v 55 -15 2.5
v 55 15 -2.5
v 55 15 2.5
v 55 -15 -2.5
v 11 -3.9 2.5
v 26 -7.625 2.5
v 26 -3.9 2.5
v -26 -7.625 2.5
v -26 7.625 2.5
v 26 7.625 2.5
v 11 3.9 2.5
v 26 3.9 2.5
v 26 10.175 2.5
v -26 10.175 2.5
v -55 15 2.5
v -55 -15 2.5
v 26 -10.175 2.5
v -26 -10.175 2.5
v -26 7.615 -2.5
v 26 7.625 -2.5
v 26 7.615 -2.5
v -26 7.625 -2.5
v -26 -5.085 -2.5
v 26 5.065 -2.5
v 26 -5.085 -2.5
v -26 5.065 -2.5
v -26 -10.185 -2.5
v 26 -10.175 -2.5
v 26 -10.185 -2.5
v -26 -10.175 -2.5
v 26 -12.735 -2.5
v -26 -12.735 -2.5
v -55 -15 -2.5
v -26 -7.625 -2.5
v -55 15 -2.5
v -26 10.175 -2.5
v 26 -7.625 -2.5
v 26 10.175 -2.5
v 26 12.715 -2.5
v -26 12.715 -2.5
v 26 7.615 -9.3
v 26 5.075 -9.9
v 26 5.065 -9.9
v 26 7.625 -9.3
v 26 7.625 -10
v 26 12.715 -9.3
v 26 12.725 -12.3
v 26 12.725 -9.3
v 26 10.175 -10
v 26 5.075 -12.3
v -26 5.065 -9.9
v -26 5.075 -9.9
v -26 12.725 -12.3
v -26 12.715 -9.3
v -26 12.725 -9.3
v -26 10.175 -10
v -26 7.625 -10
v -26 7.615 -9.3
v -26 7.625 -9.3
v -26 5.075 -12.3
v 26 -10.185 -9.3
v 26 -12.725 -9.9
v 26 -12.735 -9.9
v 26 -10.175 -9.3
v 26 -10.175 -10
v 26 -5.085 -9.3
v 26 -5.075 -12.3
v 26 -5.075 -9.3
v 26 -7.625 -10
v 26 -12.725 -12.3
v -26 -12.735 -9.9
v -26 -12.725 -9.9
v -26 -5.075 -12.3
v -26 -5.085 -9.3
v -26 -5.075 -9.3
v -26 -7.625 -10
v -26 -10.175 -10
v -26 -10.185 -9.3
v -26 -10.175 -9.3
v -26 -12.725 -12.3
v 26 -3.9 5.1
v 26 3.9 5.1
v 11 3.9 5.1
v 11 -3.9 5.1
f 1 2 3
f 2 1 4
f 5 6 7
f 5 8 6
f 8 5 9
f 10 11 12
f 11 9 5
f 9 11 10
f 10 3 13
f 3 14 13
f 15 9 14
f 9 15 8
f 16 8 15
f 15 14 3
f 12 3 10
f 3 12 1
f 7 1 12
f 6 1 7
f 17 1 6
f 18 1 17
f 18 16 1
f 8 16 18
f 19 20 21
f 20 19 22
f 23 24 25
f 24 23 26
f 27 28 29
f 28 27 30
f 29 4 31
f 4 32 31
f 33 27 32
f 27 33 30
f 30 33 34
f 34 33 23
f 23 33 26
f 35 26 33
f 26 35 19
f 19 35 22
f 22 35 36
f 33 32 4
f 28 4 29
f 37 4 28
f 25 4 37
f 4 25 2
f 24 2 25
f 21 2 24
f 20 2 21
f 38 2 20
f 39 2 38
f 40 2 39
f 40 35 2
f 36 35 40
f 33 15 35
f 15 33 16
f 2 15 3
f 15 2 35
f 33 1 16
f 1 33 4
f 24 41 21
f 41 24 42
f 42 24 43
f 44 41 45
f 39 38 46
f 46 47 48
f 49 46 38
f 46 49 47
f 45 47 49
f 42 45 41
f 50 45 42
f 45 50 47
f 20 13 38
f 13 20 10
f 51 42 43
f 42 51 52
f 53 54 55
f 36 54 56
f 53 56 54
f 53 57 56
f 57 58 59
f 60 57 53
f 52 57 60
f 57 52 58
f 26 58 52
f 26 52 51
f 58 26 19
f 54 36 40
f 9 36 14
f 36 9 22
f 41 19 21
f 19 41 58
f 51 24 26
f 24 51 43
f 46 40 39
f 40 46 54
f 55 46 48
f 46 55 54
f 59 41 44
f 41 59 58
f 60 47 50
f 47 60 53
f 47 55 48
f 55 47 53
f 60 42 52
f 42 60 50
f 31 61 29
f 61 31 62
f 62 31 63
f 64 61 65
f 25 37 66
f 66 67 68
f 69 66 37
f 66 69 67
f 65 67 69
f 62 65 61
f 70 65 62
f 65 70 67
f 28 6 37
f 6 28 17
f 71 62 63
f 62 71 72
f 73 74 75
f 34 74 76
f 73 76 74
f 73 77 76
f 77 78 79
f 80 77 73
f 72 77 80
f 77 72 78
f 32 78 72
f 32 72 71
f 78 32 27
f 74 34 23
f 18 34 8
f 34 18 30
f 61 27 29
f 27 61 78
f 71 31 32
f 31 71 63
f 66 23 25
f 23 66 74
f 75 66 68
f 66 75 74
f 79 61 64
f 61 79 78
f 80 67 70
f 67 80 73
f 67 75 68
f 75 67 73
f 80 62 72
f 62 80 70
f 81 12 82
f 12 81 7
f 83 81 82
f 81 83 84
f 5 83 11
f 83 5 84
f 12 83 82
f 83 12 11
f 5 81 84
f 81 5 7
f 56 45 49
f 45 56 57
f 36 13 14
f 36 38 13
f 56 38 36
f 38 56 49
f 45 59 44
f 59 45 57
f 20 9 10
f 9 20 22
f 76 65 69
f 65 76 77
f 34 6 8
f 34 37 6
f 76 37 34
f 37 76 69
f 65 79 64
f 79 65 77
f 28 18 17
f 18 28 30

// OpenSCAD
main_width = 110;
main_depth = 30;
main_thickness = 5;
slot_length = 52;
slot_cutout_thickness = 2.55;
slot_platform_depth = 7.8;
slot_separation = 17.8;

top_board_spacer_depth = 16.2;
top_board_spacer_width = 15;
top_board_spacer_thickness = 2.7;

difference() {
  union() {
    cube([main_width, main_depth, main_thickness], center = true);

    // left wall
    translate([0, slot_separation / 2 - slot_cutout_thickness - .01, -6])
      cube([slot_length, slot_cutout_thickness, slot_platform_depth], center = true);

    // right wall
    translate([0, slot_separation / 2 + slot_cutout_thickness - .01, -6])
      cube([slot_length, slot_cutout_thickness, slot_platform_depth], center = true);

    // floor  
     translate([0, slot_separation / 2, -slot_platform_depth - 3])
      cube([slot_length, 3 * slot_cutout_thickness, 3], center = true);

    translate([0, -slot_separation / 2 - slot_cutout_thickness - .01, -6])
      cube([slot_length, slot_cutout_thickness, slot_platform_depth], center = true);
      
    translate([0, -slot_separation / 2 + slot_cutout_thickness - .01, -6])
      cube([slot_length, slot_cutout_thickness, slot_platform_depth], center = true);

    // floor  
     translate([0, -slot_separation / 2, -slot_platform_depth - 3])
      cube([slot_length, 3 * slot_cutout_thickness, 3], center = true);
      
     translate([slot_length / 2 - top_board_spacer_width / 2, 0, main_thickness / 2 + top_board_spacer_thickness / 2 - .1])
     cube([top_board_spacer_width, slot_platform_depth, top_board_spacer_thickness], center = true);
 }

  translate([0, slot_separation / 2, 0])
  cube([slot_length, slot_cutout_thickness, 20], center = true);

  translate([0, -slot_separation / 2, 0])
  cube([slot_length, slot_cutout_thickness, 20], center = true);
}
